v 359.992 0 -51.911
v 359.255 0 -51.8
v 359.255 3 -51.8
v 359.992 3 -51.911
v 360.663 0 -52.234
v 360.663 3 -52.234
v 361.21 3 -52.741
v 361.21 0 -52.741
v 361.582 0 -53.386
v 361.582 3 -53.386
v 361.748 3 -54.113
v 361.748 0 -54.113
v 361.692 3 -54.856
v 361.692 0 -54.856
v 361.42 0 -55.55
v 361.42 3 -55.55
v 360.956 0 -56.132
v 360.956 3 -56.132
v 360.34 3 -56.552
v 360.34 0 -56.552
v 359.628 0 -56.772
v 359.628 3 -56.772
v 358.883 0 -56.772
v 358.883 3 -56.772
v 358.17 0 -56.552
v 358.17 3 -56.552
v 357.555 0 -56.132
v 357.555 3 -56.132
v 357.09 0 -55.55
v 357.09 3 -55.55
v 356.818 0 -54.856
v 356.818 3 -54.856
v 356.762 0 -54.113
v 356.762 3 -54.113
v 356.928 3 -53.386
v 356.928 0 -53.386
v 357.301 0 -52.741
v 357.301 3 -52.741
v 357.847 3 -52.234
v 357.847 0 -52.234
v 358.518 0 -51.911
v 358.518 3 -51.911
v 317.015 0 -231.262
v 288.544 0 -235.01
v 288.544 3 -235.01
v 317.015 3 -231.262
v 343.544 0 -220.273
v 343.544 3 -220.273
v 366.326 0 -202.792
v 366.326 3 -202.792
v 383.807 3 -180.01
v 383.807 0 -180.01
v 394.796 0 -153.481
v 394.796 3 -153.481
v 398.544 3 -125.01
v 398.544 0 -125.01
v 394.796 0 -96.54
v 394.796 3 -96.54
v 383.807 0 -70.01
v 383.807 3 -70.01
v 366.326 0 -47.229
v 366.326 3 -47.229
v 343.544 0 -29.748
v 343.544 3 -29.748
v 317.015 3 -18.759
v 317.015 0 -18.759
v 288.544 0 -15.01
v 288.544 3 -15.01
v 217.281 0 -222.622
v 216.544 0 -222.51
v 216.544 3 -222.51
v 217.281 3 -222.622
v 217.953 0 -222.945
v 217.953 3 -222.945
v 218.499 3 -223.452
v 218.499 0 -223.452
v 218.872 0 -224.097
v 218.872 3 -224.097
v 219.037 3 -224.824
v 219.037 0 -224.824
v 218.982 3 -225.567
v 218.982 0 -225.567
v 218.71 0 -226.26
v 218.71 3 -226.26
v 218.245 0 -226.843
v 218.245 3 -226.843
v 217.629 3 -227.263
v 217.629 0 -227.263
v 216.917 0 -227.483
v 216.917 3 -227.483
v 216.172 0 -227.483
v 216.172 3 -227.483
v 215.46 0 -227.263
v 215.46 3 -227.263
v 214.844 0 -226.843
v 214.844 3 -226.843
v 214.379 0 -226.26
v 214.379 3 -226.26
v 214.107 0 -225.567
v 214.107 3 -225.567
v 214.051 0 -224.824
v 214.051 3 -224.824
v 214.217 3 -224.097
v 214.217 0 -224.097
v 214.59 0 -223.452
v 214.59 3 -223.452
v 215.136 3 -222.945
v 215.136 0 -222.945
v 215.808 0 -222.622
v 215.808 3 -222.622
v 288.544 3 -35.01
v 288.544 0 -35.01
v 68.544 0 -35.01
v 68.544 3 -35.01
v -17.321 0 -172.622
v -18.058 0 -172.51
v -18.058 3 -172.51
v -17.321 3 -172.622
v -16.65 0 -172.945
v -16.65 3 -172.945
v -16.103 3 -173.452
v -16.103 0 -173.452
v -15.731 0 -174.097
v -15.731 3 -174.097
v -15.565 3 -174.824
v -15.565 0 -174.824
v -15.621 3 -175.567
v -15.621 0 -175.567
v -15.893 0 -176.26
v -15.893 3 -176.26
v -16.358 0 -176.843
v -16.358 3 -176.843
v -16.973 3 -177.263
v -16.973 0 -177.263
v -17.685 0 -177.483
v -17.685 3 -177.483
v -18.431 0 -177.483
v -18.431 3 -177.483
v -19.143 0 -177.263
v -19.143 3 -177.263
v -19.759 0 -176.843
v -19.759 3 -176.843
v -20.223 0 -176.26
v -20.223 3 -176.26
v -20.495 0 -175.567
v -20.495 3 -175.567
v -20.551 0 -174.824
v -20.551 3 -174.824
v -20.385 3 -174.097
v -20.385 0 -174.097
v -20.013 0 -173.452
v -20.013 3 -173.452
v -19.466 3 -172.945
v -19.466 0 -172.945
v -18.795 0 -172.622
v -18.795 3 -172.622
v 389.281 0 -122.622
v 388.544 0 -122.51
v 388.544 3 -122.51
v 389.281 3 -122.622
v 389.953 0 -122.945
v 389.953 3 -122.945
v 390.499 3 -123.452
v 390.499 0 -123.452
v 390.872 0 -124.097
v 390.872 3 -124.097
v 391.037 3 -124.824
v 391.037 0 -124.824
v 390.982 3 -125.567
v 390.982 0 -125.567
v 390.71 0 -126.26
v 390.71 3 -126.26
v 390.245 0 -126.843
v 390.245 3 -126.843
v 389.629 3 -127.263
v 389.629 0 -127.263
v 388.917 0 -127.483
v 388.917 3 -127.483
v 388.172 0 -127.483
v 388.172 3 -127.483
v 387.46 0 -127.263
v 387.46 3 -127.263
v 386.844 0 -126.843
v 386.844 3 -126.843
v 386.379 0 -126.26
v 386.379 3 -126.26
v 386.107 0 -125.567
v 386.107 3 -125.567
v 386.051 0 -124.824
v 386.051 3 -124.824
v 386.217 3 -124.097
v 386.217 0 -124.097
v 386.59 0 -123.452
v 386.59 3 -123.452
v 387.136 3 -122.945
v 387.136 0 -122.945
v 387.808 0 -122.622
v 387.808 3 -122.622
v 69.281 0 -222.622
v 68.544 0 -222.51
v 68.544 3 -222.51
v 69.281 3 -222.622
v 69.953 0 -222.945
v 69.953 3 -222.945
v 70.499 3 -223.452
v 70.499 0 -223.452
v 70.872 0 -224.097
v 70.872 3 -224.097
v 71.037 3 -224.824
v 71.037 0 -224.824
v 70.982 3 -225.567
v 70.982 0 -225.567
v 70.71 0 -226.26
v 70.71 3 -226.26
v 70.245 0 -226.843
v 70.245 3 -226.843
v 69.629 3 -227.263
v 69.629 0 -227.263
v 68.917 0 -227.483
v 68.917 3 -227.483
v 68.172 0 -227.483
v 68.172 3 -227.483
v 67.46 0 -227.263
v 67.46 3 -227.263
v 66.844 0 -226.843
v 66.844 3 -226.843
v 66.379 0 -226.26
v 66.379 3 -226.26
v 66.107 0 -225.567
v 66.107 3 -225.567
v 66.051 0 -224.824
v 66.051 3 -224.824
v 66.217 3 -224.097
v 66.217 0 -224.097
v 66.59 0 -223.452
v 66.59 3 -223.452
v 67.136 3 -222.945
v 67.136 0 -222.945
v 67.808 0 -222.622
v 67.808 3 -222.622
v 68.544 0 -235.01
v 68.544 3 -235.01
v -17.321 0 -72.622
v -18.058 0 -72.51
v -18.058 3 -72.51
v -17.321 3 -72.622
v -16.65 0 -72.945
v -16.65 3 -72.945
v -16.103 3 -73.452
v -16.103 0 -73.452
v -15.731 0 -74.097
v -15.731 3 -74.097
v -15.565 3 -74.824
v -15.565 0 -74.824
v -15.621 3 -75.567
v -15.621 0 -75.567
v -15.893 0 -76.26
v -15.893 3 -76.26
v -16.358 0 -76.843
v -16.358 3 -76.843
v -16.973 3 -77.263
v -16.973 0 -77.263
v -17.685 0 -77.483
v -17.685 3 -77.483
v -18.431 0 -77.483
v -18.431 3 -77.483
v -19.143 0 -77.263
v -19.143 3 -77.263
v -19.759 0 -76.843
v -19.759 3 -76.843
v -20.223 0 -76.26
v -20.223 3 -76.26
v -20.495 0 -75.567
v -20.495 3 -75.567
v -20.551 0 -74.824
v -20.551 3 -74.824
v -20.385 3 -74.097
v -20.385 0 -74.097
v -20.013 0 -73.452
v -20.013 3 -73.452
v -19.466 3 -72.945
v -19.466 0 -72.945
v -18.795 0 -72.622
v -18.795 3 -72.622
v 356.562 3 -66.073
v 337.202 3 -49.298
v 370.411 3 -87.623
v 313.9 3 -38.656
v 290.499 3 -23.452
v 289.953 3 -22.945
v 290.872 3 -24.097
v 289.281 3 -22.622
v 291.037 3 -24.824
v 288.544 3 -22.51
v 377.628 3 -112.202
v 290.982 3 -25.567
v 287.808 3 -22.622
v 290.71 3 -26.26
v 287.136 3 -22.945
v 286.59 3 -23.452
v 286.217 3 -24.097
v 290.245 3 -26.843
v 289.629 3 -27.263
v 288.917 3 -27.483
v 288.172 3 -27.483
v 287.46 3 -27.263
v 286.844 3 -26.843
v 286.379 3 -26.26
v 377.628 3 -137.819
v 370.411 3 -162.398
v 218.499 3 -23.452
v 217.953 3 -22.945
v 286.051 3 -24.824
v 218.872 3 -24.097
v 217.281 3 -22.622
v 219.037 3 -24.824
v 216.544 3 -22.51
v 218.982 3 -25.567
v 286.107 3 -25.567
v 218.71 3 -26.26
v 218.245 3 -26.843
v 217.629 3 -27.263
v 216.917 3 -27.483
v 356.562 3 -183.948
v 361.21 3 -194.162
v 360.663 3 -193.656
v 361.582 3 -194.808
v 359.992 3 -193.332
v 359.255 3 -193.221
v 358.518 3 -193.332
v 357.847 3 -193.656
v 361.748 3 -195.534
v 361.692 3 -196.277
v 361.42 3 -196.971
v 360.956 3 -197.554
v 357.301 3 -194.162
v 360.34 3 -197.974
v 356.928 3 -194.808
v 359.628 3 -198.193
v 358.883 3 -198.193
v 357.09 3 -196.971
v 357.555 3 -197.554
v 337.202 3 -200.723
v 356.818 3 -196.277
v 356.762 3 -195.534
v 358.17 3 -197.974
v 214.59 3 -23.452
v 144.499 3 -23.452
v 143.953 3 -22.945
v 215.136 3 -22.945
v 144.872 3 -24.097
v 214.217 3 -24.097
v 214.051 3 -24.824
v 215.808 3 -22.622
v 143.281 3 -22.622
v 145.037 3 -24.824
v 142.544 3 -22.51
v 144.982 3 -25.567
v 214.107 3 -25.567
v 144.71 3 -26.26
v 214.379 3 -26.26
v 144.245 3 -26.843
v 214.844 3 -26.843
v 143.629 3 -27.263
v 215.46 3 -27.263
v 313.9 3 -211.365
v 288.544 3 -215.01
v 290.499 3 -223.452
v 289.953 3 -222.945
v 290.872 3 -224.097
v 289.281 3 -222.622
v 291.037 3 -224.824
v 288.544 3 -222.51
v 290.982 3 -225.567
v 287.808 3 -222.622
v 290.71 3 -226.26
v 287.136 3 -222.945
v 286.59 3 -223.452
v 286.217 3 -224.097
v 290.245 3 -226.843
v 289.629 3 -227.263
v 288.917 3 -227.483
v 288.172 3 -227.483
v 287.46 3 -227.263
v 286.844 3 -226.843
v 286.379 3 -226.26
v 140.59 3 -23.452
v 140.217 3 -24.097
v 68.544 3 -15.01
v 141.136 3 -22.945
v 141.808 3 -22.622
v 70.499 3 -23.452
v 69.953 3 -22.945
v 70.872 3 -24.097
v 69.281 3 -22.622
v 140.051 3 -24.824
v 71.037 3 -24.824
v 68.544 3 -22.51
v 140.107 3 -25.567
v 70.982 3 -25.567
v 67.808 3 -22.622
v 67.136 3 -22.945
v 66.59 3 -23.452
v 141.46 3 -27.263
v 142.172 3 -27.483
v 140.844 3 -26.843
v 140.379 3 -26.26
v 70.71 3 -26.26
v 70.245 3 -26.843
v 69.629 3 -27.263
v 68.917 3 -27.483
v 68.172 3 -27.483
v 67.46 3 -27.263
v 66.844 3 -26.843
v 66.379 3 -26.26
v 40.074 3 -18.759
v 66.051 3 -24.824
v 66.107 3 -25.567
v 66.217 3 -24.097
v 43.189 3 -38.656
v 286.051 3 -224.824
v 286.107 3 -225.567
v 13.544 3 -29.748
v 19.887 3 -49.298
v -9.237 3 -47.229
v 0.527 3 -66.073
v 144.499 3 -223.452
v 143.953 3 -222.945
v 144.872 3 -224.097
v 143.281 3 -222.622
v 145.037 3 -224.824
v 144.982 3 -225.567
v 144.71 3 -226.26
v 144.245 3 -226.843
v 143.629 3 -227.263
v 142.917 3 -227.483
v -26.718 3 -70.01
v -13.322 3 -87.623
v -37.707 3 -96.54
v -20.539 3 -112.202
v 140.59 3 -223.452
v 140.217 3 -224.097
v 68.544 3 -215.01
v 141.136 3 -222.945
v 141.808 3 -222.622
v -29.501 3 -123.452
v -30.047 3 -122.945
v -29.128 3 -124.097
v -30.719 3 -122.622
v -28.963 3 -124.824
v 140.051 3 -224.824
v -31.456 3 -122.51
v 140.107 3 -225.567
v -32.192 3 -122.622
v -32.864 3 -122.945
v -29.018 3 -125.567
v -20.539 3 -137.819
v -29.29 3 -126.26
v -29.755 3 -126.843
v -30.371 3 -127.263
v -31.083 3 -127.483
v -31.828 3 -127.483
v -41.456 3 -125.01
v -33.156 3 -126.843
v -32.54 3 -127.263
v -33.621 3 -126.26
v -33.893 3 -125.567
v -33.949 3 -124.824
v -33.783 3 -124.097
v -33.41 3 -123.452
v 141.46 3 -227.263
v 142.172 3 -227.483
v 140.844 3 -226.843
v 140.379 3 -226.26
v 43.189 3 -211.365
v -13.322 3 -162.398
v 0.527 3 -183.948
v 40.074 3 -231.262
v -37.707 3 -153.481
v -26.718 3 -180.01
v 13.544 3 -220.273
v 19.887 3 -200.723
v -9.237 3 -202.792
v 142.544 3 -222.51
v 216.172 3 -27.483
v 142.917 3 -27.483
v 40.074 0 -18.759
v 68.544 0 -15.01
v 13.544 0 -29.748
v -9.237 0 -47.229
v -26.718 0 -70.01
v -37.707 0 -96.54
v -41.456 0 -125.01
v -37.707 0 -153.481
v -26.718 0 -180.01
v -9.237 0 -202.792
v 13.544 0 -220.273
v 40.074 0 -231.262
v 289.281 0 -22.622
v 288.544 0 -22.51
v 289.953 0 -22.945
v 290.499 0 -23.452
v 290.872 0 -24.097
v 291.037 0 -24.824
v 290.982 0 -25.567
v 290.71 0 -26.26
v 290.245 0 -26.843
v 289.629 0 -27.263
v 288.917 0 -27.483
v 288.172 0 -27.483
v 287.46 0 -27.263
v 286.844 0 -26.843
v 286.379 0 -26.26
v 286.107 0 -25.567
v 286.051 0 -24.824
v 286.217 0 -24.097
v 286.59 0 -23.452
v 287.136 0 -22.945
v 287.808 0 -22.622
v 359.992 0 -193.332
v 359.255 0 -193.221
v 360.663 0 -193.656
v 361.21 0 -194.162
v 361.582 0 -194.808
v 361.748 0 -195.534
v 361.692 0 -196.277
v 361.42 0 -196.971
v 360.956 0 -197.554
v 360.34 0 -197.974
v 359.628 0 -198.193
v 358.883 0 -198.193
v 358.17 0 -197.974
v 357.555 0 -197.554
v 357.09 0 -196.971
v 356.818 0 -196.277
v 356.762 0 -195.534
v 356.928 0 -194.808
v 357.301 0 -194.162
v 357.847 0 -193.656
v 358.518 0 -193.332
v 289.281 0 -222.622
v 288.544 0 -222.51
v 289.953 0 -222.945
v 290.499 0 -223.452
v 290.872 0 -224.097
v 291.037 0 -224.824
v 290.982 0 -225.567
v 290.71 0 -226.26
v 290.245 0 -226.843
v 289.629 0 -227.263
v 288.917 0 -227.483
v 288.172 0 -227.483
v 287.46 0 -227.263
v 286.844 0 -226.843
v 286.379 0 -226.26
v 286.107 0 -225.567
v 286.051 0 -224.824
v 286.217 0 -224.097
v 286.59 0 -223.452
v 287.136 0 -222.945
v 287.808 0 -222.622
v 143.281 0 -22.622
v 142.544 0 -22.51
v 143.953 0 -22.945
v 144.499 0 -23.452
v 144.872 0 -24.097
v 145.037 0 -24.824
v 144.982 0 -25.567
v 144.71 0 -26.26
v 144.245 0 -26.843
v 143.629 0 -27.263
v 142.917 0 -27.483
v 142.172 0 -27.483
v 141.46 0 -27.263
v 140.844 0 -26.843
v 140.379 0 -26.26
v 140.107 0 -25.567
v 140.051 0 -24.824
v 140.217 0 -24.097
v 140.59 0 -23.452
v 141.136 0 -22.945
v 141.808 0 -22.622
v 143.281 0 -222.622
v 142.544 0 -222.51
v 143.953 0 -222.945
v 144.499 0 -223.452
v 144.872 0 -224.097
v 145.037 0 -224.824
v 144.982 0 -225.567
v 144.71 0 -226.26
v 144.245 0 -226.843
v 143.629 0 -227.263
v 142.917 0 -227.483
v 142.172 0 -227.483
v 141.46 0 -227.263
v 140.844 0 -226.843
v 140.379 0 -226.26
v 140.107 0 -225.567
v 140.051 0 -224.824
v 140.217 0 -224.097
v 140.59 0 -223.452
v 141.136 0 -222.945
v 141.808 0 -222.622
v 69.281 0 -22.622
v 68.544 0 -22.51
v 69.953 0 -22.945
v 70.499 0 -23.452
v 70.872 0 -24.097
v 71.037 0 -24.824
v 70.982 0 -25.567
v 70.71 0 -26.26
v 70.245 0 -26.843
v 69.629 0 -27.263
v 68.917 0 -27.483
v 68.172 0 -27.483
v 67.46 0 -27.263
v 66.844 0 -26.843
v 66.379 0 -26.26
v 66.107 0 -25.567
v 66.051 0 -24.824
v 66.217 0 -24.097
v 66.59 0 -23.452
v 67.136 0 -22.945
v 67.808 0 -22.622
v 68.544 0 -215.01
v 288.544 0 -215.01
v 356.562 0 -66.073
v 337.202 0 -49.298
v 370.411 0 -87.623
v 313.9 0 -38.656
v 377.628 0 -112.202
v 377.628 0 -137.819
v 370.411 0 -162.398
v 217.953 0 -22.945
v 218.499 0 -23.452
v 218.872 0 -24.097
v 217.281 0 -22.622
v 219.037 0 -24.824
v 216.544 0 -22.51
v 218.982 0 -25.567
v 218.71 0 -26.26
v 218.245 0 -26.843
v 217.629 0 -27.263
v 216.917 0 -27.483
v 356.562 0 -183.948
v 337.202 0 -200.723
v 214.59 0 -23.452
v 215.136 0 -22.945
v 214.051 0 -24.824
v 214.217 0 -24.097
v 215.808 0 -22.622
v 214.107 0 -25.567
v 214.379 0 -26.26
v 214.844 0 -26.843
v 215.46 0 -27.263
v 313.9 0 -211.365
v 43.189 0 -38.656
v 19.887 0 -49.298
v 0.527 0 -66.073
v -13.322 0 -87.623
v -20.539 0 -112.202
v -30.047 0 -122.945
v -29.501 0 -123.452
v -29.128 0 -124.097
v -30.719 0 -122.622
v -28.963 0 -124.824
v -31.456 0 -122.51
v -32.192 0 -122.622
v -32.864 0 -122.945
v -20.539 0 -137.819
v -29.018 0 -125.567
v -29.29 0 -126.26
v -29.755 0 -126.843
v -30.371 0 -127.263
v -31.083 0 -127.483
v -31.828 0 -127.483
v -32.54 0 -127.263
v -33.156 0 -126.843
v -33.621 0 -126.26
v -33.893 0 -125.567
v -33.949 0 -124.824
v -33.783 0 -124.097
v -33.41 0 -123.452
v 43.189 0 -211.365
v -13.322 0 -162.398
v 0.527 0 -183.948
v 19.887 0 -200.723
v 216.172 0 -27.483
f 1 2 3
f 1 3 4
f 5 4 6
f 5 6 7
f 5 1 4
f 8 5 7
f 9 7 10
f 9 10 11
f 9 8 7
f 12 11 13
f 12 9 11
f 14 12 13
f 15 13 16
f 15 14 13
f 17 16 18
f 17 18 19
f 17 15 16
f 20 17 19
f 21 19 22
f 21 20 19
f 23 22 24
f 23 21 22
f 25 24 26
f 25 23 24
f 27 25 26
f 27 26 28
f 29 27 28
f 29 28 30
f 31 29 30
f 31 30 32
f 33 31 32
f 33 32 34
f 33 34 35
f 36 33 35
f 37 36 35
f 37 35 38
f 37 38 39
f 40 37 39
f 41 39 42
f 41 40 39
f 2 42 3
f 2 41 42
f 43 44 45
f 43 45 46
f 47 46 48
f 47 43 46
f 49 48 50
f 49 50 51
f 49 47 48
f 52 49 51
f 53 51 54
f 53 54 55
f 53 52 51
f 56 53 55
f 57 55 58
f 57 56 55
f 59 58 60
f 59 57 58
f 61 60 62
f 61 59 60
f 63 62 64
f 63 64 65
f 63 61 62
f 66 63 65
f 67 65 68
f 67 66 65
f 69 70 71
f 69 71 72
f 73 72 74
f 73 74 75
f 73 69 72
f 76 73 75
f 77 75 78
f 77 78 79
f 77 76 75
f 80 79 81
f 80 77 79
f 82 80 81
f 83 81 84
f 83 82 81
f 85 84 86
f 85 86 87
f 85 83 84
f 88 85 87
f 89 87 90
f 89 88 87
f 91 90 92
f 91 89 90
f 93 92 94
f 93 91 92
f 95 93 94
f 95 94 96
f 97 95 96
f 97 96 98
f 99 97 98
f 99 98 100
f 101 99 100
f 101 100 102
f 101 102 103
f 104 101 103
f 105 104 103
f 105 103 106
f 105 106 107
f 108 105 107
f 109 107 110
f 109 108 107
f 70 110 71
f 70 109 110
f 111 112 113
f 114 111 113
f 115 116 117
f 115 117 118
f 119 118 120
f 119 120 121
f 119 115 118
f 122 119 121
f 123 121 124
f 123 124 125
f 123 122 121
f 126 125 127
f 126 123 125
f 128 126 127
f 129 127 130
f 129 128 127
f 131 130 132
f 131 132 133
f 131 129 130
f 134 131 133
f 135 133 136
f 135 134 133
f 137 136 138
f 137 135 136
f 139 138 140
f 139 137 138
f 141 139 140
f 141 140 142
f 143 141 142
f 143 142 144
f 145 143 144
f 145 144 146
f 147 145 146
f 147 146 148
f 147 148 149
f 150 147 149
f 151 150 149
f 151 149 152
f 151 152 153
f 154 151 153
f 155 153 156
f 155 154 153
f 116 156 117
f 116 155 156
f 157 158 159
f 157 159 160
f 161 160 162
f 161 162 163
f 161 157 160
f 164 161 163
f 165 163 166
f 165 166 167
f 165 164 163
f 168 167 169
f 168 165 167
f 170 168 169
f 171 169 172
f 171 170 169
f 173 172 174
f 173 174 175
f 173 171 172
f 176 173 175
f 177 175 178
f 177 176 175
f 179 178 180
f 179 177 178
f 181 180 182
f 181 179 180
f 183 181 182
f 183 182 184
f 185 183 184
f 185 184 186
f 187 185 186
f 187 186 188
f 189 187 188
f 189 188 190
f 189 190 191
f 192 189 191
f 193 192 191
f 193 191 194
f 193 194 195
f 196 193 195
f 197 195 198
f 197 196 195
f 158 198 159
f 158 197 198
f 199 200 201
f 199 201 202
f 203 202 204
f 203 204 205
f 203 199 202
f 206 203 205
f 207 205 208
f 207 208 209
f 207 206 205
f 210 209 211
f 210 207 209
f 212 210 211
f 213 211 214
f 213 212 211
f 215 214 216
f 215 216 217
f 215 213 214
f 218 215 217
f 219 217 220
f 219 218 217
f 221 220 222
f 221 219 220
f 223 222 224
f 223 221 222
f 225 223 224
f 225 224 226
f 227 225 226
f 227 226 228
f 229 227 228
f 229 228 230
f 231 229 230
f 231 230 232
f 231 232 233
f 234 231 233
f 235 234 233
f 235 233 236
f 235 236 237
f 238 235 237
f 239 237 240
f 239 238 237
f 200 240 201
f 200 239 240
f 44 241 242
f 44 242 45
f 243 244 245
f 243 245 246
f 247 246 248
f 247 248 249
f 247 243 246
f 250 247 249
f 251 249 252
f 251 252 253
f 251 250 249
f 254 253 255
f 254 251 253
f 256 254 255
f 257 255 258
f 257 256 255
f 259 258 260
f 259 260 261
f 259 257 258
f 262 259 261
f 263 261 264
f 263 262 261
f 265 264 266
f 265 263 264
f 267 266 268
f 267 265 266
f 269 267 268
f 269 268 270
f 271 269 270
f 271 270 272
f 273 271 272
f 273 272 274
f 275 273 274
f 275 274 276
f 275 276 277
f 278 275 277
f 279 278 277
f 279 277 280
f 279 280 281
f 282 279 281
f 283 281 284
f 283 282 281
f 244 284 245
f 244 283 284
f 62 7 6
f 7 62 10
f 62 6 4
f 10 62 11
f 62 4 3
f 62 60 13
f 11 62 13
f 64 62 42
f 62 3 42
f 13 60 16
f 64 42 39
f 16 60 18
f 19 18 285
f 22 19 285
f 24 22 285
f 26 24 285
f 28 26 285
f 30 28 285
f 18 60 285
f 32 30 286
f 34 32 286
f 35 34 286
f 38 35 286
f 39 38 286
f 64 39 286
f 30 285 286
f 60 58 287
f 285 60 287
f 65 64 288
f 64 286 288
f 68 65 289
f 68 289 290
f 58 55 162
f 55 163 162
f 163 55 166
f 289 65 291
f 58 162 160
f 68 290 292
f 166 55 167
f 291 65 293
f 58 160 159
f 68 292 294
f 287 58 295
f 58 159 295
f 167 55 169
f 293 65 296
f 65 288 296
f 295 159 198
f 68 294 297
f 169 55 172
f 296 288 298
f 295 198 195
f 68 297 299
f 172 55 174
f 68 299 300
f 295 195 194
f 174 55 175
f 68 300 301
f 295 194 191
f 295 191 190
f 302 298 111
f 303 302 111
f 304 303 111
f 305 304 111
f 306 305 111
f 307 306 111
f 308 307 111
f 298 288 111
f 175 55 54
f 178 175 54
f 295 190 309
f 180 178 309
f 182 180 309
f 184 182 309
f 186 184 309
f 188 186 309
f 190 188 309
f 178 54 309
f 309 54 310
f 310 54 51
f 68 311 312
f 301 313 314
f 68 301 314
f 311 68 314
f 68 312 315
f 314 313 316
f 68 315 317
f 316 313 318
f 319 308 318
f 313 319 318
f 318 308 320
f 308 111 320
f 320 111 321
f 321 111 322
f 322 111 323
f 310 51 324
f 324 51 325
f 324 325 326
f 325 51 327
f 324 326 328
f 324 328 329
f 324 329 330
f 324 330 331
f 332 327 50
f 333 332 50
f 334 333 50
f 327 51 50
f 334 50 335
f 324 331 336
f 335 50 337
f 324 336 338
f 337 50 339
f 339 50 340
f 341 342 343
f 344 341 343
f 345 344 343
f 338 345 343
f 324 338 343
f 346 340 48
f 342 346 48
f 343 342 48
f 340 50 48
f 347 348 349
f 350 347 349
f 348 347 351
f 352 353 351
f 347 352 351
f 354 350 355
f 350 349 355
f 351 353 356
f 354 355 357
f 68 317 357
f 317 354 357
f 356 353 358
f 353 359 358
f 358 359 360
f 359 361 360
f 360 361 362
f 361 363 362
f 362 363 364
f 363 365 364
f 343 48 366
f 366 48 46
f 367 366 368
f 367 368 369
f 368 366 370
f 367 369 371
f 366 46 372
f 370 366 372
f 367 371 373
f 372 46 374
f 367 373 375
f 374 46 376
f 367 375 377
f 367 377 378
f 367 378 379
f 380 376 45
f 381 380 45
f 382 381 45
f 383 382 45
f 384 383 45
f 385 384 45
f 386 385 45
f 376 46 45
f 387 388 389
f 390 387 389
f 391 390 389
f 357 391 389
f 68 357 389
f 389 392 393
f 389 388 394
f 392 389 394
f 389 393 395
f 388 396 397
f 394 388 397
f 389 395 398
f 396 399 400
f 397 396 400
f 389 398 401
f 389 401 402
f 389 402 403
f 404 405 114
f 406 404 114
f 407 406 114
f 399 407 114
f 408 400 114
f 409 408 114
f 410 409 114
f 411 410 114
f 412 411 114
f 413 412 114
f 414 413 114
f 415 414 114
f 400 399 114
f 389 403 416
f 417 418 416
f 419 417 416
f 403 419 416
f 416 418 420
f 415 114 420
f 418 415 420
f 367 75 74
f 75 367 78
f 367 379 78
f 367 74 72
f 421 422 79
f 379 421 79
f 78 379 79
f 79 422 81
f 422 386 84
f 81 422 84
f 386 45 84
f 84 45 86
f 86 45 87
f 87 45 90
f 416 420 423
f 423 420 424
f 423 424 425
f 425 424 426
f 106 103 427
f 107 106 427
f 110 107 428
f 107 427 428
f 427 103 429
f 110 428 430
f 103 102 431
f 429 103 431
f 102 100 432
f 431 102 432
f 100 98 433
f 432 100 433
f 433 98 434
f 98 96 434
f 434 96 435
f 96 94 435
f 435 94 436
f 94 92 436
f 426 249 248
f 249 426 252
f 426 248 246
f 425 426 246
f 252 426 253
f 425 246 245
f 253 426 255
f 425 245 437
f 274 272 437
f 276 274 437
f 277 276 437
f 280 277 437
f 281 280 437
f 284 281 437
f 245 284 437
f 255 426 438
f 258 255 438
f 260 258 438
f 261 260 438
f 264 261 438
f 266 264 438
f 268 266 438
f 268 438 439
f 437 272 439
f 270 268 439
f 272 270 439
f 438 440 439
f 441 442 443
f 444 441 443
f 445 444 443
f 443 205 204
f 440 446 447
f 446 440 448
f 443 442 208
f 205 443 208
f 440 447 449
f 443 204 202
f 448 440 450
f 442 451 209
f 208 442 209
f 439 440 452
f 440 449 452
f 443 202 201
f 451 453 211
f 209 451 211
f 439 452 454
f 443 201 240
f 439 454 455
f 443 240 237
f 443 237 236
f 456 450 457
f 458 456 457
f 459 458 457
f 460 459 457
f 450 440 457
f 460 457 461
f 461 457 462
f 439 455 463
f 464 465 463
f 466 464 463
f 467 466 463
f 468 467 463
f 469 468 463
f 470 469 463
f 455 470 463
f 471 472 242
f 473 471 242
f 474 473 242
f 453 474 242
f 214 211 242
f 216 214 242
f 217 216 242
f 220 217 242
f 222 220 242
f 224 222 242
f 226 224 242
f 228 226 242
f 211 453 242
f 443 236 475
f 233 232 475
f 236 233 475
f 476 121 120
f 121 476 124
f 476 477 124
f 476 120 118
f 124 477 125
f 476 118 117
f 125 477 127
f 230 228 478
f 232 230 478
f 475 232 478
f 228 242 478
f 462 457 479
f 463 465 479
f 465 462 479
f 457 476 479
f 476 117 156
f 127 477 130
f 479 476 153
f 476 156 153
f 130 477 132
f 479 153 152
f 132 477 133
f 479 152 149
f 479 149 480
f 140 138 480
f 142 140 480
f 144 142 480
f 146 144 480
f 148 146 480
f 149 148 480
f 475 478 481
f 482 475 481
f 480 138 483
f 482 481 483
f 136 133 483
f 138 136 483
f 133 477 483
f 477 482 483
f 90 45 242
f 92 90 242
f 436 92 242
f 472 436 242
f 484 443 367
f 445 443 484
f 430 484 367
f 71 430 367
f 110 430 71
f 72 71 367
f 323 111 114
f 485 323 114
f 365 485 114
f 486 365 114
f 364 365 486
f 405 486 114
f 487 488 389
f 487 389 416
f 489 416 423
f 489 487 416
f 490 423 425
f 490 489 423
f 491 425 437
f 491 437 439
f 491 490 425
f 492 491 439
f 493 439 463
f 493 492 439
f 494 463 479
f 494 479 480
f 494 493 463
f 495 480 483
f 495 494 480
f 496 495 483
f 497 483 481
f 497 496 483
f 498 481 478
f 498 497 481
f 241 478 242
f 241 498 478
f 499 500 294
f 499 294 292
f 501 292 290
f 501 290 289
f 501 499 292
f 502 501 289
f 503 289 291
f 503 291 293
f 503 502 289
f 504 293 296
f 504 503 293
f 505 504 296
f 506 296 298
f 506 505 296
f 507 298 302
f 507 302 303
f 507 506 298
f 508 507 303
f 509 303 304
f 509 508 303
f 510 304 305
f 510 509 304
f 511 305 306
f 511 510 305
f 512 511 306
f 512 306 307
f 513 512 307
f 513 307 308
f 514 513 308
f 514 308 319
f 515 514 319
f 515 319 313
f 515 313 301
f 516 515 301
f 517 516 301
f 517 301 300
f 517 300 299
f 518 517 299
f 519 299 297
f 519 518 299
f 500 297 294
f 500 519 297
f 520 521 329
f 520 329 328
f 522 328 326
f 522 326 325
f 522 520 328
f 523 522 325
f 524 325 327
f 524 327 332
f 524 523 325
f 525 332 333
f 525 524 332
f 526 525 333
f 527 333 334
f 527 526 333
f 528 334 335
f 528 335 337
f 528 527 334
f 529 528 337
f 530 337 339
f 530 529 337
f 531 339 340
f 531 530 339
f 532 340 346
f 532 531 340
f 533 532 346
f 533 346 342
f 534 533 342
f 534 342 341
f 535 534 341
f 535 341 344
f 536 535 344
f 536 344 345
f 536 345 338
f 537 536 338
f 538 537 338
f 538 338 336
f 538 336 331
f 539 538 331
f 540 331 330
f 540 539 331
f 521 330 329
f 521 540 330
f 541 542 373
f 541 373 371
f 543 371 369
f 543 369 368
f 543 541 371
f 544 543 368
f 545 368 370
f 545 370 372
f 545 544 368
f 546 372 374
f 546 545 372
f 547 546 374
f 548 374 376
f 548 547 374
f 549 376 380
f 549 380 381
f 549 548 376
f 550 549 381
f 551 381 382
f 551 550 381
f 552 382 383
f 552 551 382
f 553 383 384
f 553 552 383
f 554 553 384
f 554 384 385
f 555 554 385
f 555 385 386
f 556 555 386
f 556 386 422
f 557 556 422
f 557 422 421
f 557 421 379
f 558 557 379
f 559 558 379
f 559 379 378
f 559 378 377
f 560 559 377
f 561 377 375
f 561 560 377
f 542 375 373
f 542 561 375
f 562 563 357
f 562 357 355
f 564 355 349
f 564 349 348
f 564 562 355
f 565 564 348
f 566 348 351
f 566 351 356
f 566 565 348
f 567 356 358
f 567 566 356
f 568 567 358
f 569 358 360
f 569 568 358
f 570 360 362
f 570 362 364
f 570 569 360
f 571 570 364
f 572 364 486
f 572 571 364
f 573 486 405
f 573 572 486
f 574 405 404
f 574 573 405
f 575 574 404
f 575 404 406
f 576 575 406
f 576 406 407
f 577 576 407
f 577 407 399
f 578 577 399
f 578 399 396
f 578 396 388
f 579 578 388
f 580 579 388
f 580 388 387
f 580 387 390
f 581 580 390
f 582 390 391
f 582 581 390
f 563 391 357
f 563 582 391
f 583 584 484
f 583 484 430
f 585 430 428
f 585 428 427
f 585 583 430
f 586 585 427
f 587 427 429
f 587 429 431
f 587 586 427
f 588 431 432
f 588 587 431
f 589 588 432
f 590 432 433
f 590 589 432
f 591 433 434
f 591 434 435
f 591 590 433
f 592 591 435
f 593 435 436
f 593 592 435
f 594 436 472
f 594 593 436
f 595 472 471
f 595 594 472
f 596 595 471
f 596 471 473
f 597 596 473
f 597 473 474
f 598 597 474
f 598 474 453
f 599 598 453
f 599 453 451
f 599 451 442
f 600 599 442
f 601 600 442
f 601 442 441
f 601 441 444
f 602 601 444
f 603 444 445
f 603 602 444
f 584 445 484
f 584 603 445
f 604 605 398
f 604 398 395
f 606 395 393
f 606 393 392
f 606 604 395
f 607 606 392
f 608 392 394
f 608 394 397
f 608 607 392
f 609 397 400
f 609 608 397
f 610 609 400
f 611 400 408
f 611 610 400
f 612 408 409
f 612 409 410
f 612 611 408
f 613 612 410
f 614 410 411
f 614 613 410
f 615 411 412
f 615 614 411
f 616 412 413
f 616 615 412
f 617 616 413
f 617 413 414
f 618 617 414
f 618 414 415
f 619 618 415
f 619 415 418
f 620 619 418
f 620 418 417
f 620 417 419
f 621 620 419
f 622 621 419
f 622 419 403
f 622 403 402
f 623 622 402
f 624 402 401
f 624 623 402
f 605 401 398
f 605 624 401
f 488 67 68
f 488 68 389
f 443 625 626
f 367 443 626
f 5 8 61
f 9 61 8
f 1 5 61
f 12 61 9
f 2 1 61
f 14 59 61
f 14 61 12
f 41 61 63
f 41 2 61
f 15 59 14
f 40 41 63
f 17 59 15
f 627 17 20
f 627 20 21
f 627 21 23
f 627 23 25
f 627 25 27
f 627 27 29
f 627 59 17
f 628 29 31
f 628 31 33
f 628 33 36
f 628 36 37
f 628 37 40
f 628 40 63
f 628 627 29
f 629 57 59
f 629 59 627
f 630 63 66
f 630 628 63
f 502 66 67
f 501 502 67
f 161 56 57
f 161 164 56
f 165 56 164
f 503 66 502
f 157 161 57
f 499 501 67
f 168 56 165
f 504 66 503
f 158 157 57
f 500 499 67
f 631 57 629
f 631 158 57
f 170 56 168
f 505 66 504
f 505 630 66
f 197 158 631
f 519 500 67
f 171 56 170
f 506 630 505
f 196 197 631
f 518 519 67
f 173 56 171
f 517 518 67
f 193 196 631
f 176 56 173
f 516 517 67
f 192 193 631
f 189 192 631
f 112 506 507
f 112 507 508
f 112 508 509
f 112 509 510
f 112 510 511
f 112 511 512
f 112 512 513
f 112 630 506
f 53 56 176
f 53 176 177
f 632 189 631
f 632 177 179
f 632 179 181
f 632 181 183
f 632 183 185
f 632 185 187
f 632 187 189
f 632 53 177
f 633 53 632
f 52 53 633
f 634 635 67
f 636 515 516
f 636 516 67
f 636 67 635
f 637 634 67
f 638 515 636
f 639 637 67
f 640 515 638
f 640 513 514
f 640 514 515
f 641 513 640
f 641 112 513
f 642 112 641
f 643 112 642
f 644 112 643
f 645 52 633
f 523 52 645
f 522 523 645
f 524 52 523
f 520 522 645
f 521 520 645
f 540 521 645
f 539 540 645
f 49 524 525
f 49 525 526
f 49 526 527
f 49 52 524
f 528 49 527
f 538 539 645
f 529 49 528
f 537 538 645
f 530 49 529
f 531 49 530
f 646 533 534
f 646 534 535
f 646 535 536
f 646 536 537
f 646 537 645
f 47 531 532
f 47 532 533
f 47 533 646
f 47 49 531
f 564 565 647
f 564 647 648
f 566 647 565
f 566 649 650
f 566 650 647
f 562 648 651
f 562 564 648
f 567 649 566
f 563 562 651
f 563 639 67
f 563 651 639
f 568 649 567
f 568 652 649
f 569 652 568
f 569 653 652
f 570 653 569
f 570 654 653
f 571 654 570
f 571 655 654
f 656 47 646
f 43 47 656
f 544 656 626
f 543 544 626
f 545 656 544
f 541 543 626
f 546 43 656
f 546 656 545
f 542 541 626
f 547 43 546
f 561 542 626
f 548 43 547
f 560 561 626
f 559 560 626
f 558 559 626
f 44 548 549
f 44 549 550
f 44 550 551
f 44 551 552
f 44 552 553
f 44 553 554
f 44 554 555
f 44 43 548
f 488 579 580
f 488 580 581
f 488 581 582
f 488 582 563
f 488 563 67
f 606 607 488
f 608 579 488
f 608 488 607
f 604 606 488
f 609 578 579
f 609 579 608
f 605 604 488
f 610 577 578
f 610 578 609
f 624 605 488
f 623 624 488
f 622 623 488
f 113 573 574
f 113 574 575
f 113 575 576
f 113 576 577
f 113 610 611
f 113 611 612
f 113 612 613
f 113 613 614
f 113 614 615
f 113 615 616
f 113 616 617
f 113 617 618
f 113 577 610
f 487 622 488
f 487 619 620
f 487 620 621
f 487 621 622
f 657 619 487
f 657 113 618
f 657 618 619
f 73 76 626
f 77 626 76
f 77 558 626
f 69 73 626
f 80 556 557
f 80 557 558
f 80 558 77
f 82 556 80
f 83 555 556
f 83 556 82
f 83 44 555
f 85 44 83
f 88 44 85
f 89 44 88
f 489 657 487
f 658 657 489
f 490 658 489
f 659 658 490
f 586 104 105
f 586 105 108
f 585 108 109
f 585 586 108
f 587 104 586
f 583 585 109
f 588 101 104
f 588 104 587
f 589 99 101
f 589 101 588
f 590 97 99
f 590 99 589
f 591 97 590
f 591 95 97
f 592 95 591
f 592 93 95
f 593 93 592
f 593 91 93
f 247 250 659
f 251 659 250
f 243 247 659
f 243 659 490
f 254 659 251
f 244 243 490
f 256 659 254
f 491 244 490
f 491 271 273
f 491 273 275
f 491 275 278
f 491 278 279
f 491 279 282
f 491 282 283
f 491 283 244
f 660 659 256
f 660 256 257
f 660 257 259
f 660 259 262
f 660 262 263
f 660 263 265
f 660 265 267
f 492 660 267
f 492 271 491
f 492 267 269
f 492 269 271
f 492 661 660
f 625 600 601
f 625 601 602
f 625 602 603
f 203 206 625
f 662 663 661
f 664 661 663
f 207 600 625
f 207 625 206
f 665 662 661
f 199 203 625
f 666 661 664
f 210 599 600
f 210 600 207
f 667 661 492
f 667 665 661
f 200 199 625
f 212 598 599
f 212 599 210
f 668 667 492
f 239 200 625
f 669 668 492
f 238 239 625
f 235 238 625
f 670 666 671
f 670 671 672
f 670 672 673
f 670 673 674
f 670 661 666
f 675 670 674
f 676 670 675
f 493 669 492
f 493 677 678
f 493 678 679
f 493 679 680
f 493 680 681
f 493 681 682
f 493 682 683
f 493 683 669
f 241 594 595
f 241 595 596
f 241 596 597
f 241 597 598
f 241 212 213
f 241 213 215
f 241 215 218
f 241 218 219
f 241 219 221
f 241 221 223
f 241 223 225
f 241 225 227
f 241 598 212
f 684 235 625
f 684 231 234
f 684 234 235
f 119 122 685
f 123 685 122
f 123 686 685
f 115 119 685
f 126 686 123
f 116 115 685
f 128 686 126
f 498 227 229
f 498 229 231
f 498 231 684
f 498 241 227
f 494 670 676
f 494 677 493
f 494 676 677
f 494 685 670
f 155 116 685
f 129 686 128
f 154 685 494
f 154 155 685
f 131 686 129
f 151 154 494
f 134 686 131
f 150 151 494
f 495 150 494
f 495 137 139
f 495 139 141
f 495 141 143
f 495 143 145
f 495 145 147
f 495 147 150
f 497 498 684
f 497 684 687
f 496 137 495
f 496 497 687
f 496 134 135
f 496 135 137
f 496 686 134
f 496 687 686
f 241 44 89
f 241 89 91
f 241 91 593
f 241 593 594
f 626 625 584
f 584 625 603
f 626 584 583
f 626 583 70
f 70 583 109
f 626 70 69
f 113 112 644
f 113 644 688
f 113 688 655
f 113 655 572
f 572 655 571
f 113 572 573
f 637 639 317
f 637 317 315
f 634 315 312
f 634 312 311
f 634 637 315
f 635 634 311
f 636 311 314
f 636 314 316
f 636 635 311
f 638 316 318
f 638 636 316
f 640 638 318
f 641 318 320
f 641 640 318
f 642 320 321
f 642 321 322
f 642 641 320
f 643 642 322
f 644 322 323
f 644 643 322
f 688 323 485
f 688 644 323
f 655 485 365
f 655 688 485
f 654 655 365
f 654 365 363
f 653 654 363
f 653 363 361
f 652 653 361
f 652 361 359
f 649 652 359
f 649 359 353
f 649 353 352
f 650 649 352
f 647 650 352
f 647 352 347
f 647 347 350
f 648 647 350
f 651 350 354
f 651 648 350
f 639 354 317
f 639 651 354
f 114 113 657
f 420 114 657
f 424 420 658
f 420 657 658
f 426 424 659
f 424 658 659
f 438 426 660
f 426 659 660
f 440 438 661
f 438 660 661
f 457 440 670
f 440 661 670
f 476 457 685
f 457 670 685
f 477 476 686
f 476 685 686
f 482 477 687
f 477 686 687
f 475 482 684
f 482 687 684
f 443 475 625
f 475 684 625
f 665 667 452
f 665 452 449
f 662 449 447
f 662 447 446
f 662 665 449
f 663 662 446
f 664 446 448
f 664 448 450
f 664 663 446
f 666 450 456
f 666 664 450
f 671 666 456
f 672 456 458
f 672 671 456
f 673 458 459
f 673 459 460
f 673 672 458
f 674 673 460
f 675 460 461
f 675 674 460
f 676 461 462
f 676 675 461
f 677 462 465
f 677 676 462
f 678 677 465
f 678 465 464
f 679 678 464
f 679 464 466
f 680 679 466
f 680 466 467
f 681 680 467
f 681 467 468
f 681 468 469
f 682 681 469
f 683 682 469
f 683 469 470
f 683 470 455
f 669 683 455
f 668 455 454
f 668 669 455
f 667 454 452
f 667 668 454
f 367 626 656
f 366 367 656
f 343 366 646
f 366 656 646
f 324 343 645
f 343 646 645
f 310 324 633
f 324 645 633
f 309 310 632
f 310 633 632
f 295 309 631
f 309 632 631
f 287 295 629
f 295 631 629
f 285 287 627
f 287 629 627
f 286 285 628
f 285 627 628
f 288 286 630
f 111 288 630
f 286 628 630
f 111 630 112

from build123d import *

# Parameters (mm, degrees)
ESBO_O1_R                = 2.5
RESSALTO_EXTRUS_O2_DEPTH = 3


with BuildPart() as part:
    # Esboço1 → Ressalto-extrusão2 (new body)
    with BuildSketch(Plane(origin=(0, 0, 0), x_dir=(1, 0, 0), z_dir=(0, 1, 0))):
        with BuildLine():
            Line((68.54446848, 235.010465991), (288.54446848, 235.010465991))
            ThreePointArc((288.54446848, 235.010465991), (398.54446848, 125.010465991), (288.54446848, 15.010465991))
            Line((288.54446848, 15.010465991), (68.54446848, 15.010465991))
            ThreePointArc((68.54446848, 15.010465991), (-41.45553152, 125.010465991), (68.54446848, 235.010465991))
        make_face()
        with Locations(Location((68.54446848, 225.010465991, 0), (0, 0, 270))):
            Circle(ESBO_O1_R, mode=Mode.SUBTRACT)
        with Locations(Location((68.54446848, 25.010465991, 0), (0, 0, 270))):
            Circle(ESBO_O1_R, mode=Mode.SUBTRACT)
        with Locations(Location((288.54446848, 25.010465991, 0), (0, 0, 270))):
            Circle(ESBO_O1_R, mode=Mode.SUBTRACT)
        with Locations(Location((288.54446848, 225.010465991, 0), (0, 0, 270))):
            Circle(ESBO_O1_R, mode=Mode.SUBTRACT)
        with Locations(Location((-18.058071899, 175.010465991, 0), (0, 0, 270))):
            Circle(ESBO_O1_R, mode=Mode.SUBTRACT)
        with Locations(Location((-31.45553152, 125.010465991, 0), (0, 0, 270))):
            Circle(ESBO_O1_R, mode=Mode.SUBTRACT)
        with Locations(Location((-18.058071899, 75.010465991, 0), (0, 0, 270))):
            Circle(ESBO_O1_R, mode=Mode.SUBTRACT)
        with Locations(Location((359.255146599, 54.299787872, 0), (0, 0, 270))):
            Circle(ESBO_O1_R, mode=Mode.SUBTRACT)
        with Locations(Location((388.54446848, 125.010465991, 0), (0, 0, 270))):
            Circle(ESBO_O1_R, mode=Mode.SUBTRACT)
        with Locations(Location((359.255146599, 195.72114411, 0), (0, 0, 270))):
            Circle(ESBO_O1_R, mode=Mode.SUBTRACT)
        with Locations(Location((142.54446848, 25.010465991, 0), (0, 0, 270))):
            Circle(ESBO_O1_R, mode=Mode.SUBTRACT)
        with Locations(Location((216.54446848, 25.010465991, 0), (0, 0, 270))):
            Circle(ESBO_O1_R, mode=Mode.SUBTRACT)
        with Locations(Location((142.54446848, 225.010465991, 0), (0, 0, 270))):
            Circle(ESBO_O1_R, mode=Mode.SUBTRACT)
        with Locations(Location((216.54446848, 225.010465991, 0), (0, 0, 270))):
            Circle(ESBO_O1_R, mode=Mode.SUBTRACT)
        with BuildLine():
            Line((68.54446848, 215.010465991), (288.54446848, 215.010465991))
            ThreePointArc((288.54446848, 215.010465991), (378.54446848, 125.010465991), (288.54446848, 35.010465991))
            Line((288.54446848, 35.010465991), (68.54446848, 35.010465991))
            ThreePointArc((68.54446848, 35.010465991), (-21.45553152, 125.010465991), (68.54446848, 215.010465991))
        make_face(mode=Mode.SUBTRACT)
    extrude(amount=RESSALTO_EXTRUS_O2_DEPTH)


solid = part.part
